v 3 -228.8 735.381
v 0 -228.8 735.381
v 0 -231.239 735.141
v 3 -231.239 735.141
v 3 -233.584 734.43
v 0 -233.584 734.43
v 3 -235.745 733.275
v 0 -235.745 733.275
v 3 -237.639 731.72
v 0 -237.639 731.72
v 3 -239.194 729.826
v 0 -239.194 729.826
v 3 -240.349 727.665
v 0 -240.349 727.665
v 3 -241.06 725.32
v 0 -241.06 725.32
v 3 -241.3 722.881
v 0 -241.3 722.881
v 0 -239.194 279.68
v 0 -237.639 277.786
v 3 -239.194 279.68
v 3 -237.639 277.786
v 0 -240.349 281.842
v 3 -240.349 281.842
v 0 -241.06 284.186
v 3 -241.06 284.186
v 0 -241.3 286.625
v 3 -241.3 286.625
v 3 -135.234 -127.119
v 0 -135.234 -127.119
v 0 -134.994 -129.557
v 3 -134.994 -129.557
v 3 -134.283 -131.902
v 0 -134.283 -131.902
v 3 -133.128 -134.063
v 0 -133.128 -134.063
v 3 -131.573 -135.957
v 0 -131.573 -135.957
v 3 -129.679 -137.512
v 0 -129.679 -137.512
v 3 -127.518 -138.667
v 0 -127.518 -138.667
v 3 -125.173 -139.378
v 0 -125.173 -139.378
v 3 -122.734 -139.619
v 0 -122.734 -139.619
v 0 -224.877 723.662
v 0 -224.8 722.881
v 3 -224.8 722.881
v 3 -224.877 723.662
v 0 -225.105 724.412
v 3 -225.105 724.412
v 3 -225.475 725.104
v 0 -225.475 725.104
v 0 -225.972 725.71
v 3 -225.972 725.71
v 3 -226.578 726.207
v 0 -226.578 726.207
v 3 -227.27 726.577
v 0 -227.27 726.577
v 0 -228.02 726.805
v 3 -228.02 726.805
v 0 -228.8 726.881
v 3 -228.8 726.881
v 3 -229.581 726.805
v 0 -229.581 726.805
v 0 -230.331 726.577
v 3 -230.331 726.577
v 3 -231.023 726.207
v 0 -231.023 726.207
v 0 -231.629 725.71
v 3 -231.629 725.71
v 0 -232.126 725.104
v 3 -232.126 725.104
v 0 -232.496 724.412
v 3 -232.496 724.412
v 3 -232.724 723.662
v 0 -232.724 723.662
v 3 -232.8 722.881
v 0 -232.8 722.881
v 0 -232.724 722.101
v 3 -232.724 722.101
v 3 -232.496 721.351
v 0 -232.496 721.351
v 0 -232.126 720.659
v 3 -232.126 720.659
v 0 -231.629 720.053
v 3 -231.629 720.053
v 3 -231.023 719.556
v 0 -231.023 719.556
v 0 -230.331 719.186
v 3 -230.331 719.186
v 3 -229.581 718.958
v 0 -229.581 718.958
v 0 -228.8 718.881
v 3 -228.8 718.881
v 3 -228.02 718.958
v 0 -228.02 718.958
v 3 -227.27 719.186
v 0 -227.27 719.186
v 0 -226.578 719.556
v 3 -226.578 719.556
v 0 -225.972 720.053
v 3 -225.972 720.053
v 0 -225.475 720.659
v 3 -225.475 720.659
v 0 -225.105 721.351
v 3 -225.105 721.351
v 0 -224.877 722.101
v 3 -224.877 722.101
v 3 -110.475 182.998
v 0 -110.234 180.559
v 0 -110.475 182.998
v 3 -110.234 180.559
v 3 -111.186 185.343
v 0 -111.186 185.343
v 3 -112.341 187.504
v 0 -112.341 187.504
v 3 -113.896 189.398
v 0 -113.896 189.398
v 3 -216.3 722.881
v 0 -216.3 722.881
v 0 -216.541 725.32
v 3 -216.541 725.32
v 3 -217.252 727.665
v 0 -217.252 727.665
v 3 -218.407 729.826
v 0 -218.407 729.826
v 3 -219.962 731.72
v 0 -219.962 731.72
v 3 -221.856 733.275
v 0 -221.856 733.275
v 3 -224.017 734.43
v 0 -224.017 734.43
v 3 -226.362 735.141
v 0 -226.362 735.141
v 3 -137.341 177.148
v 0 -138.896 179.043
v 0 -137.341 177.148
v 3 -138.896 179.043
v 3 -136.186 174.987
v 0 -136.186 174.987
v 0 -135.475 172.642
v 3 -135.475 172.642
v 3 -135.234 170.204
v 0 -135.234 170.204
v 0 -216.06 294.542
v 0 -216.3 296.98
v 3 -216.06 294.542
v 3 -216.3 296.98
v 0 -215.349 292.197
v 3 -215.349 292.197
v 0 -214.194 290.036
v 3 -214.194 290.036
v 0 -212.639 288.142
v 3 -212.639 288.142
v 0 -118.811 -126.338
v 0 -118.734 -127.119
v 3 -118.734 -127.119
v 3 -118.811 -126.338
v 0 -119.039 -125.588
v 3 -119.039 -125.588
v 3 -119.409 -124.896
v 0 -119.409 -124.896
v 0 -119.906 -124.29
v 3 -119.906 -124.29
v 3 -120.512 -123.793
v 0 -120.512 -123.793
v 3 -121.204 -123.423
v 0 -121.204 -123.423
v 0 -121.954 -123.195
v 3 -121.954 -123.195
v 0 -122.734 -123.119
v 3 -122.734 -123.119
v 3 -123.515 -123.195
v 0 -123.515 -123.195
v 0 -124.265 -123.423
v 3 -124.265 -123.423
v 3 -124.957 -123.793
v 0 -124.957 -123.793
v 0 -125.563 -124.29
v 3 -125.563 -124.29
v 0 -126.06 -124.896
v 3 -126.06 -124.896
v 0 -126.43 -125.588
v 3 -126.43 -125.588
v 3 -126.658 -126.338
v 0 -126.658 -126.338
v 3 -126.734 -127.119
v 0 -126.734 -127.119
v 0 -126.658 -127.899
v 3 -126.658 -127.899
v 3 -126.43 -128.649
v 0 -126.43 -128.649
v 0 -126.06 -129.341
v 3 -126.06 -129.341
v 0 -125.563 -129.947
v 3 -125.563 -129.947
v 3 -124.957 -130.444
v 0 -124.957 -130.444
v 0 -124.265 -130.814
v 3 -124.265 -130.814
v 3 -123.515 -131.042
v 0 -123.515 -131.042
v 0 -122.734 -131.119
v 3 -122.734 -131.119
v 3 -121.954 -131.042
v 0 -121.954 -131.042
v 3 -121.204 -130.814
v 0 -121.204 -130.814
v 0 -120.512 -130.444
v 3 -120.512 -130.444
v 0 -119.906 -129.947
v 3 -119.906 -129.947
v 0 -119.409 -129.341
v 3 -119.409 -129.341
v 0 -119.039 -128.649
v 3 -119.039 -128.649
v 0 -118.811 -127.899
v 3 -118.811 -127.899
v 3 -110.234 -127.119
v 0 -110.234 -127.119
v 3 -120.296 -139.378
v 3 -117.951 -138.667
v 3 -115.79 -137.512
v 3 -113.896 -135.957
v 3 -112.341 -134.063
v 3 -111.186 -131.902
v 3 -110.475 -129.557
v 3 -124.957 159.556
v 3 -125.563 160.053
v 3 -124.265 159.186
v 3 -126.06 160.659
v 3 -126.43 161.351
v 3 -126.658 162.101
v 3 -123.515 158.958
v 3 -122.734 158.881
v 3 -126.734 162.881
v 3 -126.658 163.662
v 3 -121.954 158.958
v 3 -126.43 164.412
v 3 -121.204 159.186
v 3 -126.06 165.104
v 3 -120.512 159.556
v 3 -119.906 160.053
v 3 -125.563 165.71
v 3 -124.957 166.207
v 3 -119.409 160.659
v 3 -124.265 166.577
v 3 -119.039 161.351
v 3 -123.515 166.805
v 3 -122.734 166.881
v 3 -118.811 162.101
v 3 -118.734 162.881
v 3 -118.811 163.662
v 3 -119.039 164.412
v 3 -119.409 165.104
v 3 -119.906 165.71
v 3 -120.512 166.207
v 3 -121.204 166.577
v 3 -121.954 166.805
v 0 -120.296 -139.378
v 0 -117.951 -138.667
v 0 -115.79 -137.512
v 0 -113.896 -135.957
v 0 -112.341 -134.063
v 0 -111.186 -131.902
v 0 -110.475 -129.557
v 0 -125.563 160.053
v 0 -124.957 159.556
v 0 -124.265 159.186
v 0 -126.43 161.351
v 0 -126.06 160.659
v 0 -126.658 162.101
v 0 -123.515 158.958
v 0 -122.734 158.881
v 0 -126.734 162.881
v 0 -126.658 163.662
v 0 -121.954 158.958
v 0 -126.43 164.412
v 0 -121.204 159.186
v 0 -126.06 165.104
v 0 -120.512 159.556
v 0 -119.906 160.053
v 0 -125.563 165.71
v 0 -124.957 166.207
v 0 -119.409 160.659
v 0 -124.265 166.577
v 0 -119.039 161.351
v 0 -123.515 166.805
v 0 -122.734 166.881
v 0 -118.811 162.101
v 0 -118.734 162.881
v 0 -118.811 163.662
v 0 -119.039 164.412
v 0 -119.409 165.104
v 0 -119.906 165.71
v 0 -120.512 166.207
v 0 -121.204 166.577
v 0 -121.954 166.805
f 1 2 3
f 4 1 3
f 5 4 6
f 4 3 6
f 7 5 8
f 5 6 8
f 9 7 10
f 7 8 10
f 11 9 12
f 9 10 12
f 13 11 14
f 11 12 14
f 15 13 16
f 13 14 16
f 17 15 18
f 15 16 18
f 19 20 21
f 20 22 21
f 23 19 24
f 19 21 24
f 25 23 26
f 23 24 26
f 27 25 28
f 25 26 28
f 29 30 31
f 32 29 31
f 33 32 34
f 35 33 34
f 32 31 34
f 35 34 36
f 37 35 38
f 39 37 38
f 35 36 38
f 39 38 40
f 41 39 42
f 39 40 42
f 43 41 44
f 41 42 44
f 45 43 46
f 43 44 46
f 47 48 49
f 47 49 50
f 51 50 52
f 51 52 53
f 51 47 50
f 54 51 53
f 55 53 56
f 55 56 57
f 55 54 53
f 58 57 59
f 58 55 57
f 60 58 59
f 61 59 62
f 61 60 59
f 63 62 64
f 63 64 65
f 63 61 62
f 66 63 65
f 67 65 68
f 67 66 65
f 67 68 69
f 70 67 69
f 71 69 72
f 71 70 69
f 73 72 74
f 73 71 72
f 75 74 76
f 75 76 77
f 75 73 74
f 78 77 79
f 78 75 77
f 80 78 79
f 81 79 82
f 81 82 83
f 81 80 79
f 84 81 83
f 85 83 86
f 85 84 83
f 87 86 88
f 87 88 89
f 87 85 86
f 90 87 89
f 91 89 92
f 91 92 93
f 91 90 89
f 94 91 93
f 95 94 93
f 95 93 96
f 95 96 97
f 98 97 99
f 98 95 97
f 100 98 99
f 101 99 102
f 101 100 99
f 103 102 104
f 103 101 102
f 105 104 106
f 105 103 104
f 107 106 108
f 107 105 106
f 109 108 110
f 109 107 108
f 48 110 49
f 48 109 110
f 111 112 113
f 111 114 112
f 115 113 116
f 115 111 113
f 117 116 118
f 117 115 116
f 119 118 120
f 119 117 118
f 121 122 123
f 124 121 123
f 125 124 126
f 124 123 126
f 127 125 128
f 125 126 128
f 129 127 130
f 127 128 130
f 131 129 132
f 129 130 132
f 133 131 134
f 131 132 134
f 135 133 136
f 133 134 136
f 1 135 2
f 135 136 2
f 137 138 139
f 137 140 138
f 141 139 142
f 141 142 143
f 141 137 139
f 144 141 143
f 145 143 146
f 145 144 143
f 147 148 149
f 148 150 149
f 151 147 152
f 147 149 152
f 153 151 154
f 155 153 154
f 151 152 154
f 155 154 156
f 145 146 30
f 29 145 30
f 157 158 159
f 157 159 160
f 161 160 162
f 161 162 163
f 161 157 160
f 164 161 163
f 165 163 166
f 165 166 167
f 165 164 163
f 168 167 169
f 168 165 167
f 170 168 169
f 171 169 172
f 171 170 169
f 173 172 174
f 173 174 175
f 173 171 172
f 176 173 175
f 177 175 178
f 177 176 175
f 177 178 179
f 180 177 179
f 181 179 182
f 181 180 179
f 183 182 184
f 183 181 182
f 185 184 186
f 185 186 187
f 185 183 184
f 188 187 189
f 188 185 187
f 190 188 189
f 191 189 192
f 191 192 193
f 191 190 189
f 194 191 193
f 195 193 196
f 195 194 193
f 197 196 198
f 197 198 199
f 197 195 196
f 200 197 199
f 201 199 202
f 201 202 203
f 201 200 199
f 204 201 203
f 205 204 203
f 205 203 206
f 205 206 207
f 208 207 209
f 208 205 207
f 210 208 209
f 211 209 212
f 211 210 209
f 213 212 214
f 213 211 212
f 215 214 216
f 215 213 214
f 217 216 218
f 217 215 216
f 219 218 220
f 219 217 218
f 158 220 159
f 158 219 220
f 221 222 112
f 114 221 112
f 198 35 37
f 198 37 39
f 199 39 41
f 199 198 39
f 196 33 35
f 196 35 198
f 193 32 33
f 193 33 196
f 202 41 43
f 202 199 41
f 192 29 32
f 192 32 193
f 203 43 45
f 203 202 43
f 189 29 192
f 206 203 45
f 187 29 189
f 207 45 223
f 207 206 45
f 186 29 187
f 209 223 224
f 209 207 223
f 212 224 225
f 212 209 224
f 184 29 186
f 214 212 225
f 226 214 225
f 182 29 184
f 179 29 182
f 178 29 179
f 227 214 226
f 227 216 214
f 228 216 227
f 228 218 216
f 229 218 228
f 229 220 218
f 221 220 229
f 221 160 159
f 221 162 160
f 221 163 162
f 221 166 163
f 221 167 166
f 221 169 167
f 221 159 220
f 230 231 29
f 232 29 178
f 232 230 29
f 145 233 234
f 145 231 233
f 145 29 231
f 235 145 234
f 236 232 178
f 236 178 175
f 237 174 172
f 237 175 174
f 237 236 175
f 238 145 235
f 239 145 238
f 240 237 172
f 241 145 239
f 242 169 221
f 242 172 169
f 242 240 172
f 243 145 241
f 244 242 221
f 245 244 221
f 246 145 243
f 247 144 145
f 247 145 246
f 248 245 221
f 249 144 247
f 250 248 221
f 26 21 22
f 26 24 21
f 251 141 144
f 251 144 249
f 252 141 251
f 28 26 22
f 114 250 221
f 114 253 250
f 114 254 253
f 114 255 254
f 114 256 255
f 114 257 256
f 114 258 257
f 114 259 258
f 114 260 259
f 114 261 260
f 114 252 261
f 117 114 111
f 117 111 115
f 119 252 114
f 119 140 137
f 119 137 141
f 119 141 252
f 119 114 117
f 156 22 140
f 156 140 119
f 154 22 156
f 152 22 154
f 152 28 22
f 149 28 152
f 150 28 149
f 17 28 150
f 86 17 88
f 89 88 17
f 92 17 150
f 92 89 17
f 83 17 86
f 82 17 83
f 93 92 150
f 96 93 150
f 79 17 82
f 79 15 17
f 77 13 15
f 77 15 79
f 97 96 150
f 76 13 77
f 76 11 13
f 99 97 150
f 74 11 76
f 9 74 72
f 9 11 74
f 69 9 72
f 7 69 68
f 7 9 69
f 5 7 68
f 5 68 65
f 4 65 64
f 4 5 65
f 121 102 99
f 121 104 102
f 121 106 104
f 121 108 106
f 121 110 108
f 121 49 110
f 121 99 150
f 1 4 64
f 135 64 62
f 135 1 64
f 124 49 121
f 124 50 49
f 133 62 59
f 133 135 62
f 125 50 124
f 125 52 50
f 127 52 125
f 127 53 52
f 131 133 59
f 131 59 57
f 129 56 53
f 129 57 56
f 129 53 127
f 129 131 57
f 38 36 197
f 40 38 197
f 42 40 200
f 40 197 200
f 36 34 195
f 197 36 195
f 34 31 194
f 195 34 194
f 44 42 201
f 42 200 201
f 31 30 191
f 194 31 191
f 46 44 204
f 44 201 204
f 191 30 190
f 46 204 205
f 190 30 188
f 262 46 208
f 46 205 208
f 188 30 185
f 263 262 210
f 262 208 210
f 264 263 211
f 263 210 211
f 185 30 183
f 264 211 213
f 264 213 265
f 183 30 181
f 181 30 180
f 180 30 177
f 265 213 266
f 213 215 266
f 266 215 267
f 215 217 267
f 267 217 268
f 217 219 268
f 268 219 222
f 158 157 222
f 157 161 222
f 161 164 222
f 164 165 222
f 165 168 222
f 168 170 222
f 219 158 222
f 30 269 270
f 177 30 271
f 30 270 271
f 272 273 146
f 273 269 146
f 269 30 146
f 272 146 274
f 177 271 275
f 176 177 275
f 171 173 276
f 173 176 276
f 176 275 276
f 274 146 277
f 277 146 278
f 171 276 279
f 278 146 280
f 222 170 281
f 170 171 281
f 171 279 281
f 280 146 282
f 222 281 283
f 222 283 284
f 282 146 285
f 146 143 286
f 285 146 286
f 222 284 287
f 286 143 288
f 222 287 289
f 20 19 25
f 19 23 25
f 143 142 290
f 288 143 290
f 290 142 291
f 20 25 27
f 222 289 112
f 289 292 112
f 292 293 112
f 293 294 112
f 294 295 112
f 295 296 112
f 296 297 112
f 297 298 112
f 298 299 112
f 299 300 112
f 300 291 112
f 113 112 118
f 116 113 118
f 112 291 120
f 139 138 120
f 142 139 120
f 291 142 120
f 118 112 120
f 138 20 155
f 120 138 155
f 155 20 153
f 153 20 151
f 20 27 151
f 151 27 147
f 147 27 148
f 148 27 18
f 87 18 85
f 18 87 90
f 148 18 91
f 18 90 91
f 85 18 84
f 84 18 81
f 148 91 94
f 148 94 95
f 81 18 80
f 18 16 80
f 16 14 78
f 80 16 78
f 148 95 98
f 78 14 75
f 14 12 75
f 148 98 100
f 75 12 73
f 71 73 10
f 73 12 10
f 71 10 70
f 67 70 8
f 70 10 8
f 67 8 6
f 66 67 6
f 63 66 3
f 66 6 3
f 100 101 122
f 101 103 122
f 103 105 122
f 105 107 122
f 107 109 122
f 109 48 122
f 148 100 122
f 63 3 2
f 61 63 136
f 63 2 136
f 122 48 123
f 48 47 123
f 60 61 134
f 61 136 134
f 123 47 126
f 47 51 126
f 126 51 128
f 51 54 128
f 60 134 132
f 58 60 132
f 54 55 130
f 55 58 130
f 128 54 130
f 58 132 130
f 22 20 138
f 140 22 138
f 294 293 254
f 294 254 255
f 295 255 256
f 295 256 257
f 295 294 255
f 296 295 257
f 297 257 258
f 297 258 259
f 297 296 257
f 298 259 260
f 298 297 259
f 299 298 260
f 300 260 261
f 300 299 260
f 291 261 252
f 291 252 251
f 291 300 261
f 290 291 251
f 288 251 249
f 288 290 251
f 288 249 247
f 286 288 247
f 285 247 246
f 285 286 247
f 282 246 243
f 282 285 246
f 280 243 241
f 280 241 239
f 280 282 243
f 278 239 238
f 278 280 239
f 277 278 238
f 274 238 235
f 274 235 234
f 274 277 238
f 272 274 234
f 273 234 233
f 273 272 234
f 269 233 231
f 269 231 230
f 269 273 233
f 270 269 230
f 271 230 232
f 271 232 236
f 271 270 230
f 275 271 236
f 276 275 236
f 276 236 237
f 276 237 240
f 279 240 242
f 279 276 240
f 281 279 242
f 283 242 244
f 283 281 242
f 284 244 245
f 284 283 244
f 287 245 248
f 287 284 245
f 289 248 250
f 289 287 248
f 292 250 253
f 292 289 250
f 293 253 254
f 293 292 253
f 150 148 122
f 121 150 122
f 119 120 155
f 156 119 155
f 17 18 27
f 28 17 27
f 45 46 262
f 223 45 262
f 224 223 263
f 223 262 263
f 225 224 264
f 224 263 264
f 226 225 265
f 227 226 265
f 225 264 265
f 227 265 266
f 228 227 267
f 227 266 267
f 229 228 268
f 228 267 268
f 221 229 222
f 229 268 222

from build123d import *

# Parameters (mm, degrees)
F0_R     = 4
F1_DEPTH = 3
F2_R     = 12.5
F3_R     = 12.5


with BuildPart() as f1:
    # F0 (on Right) → F1 (new body)
    with BuildSketch(Plane.YZ):
        with BuildLine():
            Line((-241.300457, 281.4474), (-135.23444, 175.381383))
            Line((-135.23444, 175.381383), (-110.23444, 175.381383))
            Line((-110.23444, 175.381383), (-110.23444, 185.736722))
            Line((-110.23444, 185.736722), (-216.300457, 291.802739))
            Line((-216.300457, 291.802739), (-216.300457, 722.881383))
            ThreePointArc((-216.300457, 722.881383), (-219.961622, 731.720217), (-228.800457, 735.381383))
            ThreePointArc((-228.800457, 735.381383), (-237.639292, 731.720217), (-241.300457, 722.881383))
            Line((-241.300457, 722.881383), (-241.300457, 281.4474))
        make_face()
        with Locations((-228.800457, 722.881383)):
            Circle(F0_R, mode=Mode.SUBTRACT)
        with BuildLine():
            Line((-110.23444, 175.381383), (-135.23444, 175.381383))
            Line((-135.23444, 175.381383), (-135.23444, -127.118617))
            ThreePointArc((-135.23444, -127.118617), (-131.573275, -135.957452), (-122.73444, -139.618617))
            ThreePointArc((-122.73444, -139.618617), (-113.895605, -135.957452), (-110.23444, -127.118617))
            Line((-110.23444, -127.118617), (-110.23444, 175.381383))
        make_face()
        with Locations((-122.73444, -127.118617)):
            Circle(F0_R, mode=Mode.SUBTRACT)
        with Locations((-122.73444, 162.881383)):
            Circle(F0_R, mode=Mode.SUBTRACT)
    extrude(amount=F1_DEPTH)

    # F2
    f2_edges = [f1.edges().sort_by_distance(p)[0] for p in [
        (1.5, -110.23444, 185.736722),
        (1.5, -241.300457, 281.4474),
    ]]
    fillet(f2_edges, radius=F2_R)

    # F3
    f3_edges = [f1.edges().sort_by_distance(p)[0] for p in [
        (1.5, -135.23444, 175.381383),
        (1.5, -216.300457, 291.802739),
    ]]
    fillet(f3_edges, radius=F3_R)


solid = f1.part
